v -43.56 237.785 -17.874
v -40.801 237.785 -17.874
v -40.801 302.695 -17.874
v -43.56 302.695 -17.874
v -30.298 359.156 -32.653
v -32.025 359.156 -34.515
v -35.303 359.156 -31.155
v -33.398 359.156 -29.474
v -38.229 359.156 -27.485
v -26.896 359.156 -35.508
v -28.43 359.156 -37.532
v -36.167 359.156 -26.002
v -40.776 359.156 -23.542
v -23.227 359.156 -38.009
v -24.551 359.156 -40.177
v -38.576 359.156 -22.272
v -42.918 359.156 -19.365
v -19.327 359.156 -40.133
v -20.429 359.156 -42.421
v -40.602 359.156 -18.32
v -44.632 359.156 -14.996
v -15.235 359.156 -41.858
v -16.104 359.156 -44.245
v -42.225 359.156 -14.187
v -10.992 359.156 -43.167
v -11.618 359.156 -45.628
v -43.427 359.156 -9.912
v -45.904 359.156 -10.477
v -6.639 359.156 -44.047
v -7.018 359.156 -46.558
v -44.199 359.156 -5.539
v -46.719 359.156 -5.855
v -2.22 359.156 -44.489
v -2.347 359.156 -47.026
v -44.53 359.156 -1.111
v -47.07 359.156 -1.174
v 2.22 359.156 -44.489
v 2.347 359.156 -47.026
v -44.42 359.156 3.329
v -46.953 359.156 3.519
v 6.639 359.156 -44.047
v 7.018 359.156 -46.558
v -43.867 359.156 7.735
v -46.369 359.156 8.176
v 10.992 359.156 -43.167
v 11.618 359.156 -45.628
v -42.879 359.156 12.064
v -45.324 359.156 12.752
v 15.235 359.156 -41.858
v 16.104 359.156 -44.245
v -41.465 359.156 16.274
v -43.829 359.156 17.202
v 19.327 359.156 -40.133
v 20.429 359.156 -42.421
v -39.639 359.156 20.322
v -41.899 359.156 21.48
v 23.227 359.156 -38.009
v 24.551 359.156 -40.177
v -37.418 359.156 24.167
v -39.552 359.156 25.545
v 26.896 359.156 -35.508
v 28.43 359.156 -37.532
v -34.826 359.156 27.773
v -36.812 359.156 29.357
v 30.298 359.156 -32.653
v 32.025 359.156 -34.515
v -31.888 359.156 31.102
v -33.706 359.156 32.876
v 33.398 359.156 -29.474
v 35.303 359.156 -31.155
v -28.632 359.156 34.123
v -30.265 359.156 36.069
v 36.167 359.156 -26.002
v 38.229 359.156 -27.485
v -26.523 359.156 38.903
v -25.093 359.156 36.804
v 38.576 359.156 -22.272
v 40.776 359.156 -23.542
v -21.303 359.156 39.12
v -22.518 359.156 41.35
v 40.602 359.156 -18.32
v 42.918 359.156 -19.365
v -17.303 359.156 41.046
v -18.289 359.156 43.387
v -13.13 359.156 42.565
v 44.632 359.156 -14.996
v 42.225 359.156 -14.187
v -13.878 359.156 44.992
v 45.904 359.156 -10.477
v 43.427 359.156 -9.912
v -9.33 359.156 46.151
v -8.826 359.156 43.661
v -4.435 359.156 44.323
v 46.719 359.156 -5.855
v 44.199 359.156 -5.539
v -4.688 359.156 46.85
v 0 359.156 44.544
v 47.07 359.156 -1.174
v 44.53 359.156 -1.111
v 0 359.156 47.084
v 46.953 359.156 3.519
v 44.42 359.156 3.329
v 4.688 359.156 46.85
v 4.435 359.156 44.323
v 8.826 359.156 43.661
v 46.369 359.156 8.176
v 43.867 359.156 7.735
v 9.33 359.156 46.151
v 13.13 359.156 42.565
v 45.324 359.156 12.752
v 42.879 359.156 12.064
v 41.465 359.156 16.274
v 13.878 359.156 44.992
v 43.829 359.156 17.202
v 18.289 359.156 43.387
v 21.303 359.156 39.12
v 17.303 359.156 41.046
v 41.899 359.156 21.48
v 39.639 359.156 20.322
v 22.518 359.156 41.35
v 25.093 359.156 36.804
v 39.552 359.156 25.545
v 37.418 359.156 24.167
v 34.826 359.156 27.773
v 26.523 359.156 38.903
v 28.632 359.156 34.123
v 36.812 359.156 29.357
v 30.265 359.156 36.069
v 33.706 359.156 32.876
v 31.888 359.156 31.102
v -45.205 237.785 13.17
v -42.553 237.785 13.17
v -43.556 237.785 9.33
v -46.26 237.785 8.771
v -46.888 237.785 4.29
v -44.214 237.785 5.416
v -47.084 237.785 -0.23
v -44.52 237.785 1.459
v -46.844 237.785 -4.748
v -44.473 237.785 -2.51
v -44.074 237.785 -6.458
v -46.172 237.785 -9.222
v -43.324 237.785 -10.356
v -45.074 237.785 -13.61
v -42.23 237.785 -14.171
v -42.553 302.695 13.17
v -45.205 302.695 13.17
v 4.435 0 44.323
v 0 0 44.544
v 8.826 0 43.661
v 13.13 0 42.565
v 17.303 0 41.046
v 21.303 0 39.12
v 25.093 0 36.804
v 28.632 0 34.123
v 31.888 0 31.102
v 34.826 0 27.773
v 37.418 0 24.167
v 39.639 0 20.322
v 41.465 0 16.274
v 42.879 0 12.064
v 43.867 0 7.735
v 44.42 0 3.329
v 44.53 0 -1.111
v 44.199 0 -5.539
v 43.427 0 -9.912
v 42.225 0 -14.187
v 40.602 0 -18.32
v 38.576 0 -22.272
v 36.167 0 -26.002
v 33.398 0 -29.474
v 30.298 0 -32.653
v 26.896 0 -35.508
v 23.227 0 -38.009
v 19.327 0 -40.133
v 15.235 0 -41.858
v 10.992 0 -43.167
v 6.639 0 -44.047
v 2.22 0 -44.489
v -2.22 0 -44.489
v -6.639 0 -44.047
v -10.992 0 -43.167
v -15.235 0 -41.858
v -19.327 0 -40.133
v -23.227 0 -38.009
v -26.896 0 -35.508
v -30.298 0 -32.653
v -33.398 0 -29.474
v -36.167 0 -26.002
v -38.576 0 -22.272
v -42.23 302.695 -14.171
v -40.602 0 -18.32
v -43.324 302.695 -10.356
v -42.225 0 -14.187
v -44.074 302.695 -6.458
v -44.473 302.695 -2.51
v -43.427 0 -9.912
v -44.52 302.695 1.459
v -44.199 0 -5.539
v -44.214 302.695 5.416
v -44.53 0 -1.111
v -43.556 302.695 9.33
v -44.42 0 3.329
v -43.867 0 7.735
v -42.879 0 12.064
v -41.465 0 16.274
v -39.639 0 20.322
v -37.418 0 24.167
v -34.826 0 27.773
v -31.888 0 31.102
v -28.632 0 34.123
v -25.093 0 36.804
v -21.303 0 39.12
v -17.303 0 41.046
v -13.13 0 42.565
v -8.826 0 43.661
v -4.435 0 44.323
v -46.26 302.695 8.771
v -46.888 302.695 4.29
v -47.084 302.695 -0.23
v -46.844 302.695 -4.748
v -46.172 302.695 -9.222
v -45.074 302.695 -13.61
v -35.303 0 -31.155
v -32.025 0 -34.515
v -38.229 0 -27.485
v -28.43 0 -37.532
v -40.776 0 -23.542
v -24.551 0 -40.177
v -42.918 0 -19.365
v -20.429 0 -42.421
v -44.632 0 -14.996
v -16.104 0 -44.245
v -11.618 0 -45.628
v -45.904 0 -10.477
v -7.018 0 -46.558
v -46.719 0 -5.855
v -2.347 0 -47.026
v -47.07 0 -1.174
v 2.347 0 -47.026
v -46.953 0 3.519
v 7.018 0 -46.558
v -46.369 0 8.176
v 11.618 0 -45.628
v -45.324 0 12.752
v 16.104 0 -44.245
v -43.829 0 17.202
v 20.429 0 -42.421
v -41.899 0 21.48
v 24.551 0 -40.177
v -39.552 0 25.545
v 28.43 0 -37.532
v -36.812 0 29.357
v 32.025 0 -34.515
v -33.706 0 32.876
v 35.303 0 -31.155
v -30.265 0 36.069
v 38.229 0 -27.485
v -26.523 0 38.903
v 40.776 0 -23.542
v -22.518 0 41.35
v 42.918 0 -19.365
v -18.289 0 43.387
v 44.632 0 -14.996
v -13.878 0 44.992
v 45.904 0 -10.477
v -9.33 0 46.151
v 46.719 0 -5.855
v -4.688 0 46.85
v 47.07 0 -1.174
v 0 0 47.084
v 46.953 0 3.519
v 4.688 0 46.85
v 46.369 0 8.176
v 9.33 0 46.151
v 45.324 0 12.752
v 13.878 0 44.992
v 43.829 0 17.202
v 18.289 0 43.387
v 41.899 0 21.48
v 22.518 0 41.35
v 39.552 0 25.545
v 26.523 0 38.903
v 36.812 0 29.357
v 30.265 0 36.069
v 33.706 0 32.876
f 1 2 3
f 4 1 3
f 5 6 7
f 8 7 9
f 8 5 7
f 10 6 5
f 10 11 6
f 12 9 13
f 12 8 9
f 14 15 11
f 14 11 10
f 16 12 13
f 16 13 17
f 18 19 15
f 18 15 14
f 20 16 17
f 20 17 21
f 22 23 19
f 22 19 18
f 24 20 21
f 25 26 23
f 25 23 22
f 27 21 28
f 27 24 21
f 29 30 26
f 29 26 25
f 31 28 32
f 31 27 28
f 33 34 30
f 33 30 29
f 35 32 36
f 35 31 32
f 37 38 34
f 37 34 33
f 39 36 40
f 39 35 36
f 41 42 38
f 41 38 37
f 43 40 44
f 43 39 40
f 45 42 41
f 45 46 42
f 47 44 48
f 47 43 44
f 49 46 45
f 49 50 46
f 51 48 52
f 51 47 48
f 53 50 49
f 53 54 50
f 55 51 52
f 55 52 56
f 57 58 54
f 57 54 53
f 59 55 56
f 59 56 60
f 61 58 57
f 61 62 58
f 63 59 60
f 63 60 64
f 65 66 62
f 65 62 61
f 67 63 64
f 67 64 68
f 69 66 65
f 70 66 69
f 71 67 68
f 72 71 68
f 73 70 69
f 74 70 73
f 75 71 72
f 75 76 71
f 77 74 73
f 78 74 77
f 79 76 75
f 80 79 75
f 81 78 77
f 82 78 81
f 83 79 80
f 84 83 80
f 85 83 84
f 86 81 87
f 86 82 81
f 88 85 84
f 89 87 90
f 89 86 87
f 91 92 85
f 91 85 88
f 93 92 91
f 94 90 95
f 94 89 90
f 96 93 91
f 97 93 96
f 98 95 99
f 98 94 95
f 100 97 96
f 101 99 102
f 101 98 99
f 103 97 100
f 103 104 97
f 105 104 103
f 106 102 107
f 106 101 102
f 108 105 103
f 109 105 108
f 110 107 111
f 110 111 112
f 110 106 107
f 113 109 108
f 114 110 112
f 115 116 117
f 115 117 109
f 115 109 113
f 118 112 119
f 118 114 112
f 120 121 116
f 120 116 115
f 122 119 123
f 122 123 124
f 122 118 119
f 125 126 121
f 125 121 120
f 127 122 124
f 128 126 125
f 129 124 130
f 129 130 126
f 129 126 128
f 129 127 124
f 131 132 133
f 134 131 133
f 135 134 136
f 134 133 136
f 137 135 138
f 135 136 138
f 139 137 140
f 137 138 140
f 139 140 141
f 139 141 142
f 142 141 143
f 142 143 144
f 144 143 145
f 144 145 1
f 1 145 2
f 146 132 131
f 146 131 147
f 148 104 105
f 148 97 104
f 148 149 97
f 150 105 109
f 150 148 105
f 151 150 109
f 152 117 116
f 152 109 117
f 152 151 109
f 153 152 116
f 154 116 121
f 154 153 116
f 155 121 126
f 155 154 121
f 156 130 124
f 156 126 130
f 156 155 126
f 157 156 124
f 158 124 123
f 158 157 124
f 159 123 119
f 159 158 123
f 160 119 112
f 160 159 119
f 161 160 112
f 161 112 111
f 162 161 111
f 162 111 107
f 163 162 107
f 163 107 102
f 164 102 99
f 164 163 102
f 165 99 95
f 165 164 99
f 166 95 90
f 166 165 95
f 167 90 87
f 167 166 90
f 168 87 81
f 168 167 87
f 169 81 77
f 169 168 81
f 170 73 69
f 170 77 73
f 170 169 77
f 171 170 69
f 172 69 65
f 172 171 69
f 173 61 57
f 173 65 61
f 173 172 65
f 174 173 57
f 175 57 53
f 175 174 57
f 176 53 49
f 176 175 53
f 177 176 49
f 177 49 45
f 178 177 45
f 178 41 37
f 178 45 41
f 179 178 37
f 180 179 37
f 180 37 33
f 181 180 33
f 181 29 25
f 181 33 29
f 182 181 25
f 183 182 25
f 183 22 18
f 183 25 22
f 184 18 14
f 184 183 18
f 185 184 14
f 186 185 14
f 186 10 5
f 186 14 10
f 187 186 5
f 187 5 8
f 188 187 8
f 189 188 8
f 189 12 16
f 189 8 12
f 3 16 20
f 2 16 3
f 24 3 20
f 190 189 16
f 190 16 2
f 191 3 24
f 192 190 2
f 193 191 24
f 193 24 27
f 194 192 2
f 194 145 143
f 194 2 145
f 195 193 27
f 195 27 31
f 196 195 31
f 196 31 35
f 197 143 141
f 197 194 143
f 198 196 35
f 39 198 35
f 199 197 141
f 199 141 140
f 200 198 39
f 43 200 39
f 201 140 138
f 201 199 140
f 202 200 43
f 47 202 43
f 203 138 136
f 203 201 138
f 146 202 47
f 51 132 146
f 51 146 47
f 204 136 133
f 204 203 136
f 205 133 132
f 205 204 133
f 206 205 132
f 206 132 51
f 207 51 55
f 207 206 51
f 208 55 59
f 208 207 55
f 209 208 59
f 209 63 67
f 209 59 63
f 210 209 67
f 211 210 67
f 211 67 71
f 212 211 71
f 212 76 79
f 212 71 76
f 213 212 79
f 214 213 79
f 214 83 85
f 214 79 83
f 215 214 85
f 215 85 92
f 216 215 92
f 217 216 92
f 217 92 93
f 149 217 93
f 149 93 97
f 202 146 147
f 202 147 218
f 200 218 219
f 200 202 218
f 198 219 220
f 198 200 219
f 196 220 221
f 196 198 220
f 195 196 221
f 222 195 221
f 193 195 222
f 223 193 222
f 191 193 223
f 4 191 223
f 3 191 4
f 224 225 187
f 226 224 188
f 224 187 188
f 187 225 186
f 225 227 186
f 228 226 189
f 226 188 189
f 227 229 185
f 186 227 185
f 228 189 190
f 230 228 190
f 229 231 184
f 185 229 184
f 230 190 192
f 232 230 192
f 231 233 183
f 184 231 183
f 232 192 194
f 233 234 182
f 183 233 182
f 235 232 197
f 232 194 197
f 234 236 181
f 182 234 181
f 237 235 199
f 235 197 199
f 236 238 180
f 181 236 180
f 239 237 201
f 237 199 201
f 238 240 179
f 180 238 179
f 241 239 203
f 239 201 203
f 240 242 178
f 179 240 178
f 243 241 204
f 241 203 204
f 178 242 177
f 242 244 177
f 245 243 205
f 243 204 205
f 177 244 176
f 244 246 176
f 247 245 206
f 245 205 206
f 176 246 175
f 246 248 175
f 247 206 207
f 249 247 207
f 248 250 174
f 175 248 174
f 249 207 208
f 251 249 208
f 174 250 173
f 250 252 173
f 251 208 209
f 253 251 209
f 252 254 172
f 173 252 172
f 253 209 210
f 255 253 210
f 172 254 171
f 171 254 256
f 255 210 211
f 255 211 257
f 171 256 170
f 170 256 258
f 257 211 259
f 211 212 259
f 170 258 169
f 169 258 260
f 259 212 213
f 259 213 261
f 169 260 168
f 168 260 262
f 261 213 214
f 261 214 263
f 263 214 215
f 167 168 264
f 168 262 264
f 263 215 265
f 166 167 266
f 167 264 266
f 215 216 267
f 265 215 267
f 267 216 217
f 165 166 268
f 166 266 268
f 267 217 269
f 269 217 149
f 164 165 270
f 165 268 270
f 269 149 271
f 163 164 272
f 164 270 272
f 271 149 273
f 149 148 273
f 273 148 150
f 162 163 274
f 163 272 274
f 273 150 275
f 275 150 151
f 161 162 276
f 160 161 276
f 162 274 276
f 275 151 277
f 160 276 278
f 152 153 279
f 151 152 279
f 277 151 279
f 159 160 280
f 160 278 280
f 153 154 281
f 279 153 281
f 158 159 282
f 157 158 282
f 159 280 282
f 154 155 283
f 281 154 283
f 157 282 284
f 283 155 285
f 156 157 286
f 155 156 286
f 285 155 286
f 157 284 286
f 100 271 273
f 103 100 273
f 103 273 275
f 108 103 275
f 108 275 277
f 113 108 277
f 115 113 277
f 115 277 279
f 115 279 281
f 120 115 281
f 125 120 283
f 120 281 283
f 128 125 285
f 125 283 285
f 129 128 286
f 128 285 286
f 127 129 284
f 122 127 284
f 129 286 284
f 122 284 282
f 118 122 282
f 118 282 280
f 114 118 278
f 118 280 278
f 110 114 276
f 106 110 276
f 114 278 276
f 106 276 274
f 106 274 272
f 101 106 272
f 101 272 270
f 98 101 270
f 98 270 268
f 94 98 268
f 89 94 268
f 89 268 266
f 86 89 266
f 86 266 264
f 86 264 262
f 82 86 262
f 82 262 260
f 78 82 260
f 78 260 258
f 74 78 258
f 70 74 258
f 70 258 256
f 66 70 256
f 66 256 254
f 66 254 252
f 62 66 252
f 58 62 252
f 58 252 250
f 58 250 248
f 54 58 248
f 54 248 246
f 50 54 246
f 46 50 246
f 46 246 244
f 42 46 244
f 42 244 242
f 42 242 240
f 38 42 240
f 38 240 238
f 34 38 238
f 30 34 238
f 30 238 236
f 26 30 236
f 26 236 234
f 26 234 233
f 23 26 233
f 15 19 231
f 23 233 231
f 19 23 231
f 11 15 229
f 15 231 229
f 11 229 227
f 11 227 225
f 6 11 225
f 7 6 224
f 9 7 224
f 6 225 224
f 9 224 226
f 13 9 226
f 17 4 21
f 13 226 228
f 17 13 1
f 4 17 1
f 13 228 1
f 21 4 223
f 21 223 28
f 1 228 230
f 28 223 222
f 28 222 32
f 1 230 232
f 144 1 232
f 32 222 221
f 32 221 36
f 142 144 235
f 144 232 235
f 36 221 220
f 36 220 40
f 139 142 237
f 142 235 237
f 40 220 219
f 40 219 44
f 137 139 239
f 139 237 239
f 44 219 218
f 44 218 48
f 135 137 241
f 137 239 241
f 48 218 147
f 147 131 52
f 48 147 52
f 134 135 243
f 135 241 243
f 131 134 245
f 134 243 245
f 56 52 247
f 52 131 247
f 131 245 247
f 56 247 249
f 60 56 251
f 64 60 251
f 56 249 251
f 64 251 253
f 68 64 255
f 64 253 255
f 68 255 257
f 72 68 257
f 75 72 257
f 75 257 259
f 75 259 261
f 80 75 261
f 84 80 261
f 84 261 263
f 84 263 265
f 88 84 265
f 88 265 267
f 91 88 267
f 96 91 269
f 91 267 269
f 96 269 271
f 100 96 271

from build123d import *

# Parameters (mm, degrees)
SKETCH1_R           = 47.084225238
BOSS_EXTRUDE1_DEPTH = 359.156
SHELL1_T            = -2.54
SKETCH2_W           = 31.043805041
SKETCH2_H           = 64.909774176
CUT_EXTRUDE1_DEPTH  = 359.156


with BuildPart() as part:
    # Sketch1 → Boss-Extrude1 (new body)
    with BuildSketch(Plane(origin=(0, 0, 0), x_dir=(1, 0, 0), z_dir=(0, 1, 0))):
        with Locations(Location((0, 0, 0), (0, 0, 270))):
            Circle(SKETCH1_R)
    extrude(amount=BOSS_EXTRUDE1_DEPTH)

    # Shell1
    shell1_openings = [part.faces().sort_by_distance(p)[0] for p in [
        (0, 359.156, 0),
        (0, 0, 0),
    ]]
    offset(amount=SHELL1_T, openings=shell1_openings, kind=Kind.INTERSECTION)

    # Sketch2 → Cut-Extrude1 (cut)
    with BuildSketch(Plane(origin=(0, 0, 0), x_dir=(0, 0, -1), z_dir=(1, 0, 0))):
        with Locations((2.351803412, 270.240021539)):
            Rectangle(SKETCH2_W, SKETCH2_H)
    extrude(amount=-CUT_EXTRUDE1_DEPTH, mode=Mode.SUBTRACT)


solid = part.part
